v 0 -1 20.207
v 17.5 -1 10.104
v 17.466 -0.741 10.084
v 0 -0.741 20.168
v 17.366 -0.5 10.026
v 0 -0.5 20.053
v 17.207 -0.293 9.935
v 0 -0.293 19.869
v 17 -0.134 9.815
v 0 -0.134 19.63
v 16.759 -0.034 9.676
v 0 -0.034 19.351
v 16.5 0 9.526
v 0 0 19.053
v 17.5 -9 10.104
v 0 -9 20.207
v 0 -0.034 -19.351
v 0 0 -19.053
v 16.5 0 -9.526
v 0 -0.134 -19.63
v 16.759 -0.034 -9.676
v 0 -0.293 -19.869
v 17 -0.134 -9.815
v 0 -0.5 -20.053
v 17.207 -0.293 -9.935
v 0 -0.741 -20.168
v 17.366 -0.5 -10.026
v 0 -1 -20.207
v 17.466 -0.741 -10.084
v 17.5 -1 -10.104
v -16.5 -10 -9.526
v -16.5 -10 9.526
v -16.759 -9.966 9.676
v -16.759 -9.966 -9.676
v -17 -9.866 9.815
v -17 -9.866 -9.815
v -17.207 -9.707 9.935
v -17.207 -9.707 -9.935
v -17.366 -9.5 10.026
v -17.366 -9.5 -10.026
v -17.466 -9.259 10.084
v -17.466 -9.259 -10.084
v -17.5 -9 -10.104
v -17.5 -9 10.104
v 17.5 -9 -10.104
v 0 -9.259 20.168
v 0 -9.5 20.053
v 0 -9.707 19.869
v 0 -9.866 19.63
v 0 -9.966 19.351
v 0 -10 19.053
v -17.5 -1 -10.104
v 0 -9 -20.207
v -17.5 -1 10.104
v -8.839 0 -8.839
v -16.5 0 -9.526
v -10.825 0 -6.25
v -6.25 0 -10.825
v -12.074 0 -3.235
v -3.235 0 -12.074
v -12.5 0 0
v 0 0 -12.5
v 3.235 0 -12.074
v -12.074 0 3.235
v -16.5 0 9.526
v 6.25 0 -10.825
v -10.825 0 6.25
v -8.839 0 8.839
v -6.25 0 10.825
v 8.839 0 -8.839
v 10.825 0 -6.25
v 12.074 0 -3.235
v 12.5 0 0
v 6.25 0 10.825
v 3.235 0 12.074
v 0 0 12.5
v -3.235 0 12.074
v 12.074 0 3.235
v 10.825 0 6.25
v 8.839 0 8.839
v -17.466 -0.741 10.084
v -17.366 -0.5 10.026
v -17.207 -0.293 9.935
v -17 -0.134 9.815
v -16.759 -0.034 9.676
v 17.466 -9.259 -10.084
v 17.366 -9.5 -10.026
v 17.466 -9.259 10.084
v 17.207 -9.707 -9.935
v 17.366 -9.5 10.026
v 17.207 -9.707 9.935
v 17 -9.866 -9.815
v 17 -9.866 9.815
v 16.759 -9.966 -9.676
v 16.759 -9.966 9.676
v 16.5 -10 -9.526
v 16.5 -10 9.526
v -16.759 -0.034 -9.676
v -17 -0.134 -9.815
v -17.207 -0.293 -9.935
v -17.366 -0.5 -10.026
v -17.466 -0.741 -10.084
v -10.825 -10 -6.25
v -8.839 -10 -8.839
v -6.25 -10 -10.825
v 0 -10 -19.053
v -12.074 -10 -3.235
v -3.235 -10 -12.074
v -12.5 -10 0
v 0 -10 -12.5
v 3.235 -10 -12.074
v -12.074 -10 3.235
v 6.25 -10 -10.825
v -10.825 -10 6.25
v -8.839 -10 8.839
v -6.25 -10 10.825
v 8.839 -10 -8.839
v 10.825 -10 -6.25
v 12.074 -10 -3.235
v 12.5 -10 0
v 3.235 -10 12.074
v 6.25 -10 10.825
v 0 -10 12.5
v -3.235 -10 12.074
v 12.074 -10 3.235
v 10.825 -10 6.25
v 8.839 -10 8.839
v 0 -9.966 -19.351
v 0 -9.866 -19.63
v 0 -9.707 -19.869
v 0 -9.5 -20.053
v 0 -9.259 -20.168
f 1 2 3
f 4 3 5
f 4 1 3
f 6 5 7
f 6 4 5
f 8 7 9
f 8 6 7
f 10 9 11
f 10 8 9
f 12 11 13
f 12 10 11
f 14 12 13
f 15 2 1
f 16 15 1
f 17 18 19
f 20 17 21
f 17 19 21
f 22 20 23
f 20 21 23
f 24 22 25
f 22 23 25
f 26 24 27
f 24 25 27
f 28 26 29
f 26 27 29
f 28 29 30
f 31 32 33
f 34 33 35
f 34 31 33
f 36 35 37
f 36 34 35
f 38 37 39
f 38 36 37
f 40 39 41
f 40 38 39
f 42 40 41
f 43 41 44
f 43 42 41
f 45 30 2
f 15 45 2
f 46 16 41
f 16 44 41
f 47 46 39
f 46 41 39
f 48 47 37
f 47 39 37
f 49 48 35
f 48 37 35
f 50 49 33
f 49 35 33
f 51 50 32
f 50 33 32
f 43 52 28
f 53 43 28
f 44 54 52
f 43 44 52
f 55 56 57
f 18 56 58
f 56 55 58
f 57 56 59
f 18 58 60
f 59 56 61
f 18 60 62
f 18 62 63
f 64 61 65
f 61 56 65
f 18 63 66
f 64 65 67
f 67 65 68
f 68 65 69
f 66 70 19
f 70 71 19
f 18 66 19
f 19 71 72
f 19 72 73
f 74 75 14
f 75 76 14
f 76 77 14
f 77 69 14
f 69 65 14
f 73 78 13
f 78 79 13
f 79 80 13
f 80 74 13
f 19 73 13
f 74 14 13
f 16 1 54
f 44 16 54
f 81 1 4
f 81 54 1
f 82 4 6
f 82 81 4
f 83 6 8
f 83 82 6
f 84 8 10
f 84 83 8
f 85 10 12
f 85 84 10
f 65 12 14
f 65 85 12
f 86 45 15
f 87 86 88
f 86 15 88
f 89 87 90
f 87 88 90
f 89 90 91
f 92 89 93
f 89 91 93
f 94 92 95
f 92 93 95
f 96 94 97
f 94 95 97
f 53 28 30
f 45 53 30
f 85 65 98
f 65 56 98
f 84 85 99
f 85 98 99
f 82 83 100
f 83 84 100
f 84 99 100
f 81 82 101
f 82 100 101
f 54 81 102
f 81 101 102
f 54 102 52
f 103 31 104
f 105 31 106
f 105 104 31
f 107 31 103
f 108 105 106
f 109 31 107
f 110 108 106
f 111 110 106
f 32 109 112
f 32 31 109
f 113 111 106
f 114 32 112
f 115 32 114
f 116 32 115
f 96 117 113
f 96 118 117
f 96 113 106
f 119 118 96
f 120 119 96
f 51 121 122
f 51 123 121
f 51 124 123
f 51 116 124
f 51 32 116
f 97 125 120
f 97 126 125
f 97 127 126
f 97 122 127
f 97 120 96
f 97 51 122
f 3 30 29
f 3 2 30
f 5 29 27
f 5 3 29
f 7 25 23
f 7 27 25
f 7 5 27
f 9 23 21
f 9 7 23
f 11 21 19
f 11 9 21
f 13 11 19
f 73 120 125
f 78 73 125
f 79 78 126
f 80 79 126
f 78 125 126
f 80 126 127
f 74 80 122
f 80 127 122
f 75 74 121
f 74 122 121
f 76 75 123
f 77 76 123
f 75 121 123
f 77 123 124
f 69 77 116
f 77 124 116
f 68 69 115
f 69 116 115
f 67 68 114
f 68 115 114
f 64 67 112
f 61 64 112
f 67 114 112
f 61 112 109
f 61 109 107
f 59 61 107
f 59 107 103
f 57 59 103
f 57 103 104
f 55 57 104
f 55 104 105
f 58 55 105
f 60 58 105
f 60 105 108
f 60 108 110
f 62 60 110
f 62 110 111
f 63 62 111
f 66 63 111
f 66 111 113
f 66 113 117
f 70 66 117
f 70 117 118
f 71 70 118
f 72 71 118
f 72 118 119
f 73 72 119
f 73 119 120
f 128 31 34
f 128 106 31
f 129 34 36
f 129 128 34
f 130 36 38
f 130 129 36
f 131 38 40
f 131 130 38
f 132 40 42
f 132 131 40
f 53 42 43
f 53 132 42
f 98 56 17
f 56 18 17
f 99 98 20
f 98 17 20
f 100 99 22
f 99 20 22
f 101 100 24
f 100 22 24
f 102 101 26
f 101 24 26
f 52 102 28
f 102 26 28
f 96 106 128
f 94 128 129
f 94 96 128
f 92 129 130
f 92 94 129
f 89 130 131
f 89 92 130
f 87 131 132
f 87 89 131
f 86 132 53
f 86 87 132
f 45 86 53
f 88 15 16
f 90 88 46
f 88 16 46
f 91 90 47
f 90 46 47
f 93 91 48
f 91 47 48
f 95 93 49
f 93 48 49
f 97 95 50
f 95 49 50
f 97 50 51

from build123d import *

# Parameters (mm, degrees)
F1_DEPTH = 10
F2_R     = 12.5
F3_DEPTH = 10.001
F4_R     = 1


with BuildPart() as f1:
    # F0 (on Front) → F1 (new body)
    with BuildSketch(Plane.XZ):
        Polygon((17.5, 10.10363), (0, 20.207259), (-17.5, 10.10363), (-17.5, -10.10363), (0, -20.207259), (17.5, -10.10363), align=None)
    extrude(amount=F1_DEPTH)

    # F2 (on face) → F3 (cut, through all)
    with BuildSketch(Plane.XZ.offset(10)):
        Circle(F2_R)
    extrude(amount=-F3_DEPTH, mode=Mode.SUBTRACT)

    # F4
    f4_edges = [f1.edges().sort_by_distance(p)[0] for p in [
        (8.75, -10, 15.155445),
        (-8.75, -10, 15.155445),
        (17.5, -10, 0),
        (8.75, -10, -15.155445),
        (-8.75, -10, -15.155445),
        (-17.5, -10, 0),
        (8.75, 0, 15.155445),
        (-8.75, 0, 15.155445),
        (-17.5, 0, 0),
        (-8.75, 0, -15.155445),
        (8.75, 0, -15.155445),
        (17.5, 0, 0),
    ]]
    fillet(f4_edges, radius=F4_R)


solid = f1.part
